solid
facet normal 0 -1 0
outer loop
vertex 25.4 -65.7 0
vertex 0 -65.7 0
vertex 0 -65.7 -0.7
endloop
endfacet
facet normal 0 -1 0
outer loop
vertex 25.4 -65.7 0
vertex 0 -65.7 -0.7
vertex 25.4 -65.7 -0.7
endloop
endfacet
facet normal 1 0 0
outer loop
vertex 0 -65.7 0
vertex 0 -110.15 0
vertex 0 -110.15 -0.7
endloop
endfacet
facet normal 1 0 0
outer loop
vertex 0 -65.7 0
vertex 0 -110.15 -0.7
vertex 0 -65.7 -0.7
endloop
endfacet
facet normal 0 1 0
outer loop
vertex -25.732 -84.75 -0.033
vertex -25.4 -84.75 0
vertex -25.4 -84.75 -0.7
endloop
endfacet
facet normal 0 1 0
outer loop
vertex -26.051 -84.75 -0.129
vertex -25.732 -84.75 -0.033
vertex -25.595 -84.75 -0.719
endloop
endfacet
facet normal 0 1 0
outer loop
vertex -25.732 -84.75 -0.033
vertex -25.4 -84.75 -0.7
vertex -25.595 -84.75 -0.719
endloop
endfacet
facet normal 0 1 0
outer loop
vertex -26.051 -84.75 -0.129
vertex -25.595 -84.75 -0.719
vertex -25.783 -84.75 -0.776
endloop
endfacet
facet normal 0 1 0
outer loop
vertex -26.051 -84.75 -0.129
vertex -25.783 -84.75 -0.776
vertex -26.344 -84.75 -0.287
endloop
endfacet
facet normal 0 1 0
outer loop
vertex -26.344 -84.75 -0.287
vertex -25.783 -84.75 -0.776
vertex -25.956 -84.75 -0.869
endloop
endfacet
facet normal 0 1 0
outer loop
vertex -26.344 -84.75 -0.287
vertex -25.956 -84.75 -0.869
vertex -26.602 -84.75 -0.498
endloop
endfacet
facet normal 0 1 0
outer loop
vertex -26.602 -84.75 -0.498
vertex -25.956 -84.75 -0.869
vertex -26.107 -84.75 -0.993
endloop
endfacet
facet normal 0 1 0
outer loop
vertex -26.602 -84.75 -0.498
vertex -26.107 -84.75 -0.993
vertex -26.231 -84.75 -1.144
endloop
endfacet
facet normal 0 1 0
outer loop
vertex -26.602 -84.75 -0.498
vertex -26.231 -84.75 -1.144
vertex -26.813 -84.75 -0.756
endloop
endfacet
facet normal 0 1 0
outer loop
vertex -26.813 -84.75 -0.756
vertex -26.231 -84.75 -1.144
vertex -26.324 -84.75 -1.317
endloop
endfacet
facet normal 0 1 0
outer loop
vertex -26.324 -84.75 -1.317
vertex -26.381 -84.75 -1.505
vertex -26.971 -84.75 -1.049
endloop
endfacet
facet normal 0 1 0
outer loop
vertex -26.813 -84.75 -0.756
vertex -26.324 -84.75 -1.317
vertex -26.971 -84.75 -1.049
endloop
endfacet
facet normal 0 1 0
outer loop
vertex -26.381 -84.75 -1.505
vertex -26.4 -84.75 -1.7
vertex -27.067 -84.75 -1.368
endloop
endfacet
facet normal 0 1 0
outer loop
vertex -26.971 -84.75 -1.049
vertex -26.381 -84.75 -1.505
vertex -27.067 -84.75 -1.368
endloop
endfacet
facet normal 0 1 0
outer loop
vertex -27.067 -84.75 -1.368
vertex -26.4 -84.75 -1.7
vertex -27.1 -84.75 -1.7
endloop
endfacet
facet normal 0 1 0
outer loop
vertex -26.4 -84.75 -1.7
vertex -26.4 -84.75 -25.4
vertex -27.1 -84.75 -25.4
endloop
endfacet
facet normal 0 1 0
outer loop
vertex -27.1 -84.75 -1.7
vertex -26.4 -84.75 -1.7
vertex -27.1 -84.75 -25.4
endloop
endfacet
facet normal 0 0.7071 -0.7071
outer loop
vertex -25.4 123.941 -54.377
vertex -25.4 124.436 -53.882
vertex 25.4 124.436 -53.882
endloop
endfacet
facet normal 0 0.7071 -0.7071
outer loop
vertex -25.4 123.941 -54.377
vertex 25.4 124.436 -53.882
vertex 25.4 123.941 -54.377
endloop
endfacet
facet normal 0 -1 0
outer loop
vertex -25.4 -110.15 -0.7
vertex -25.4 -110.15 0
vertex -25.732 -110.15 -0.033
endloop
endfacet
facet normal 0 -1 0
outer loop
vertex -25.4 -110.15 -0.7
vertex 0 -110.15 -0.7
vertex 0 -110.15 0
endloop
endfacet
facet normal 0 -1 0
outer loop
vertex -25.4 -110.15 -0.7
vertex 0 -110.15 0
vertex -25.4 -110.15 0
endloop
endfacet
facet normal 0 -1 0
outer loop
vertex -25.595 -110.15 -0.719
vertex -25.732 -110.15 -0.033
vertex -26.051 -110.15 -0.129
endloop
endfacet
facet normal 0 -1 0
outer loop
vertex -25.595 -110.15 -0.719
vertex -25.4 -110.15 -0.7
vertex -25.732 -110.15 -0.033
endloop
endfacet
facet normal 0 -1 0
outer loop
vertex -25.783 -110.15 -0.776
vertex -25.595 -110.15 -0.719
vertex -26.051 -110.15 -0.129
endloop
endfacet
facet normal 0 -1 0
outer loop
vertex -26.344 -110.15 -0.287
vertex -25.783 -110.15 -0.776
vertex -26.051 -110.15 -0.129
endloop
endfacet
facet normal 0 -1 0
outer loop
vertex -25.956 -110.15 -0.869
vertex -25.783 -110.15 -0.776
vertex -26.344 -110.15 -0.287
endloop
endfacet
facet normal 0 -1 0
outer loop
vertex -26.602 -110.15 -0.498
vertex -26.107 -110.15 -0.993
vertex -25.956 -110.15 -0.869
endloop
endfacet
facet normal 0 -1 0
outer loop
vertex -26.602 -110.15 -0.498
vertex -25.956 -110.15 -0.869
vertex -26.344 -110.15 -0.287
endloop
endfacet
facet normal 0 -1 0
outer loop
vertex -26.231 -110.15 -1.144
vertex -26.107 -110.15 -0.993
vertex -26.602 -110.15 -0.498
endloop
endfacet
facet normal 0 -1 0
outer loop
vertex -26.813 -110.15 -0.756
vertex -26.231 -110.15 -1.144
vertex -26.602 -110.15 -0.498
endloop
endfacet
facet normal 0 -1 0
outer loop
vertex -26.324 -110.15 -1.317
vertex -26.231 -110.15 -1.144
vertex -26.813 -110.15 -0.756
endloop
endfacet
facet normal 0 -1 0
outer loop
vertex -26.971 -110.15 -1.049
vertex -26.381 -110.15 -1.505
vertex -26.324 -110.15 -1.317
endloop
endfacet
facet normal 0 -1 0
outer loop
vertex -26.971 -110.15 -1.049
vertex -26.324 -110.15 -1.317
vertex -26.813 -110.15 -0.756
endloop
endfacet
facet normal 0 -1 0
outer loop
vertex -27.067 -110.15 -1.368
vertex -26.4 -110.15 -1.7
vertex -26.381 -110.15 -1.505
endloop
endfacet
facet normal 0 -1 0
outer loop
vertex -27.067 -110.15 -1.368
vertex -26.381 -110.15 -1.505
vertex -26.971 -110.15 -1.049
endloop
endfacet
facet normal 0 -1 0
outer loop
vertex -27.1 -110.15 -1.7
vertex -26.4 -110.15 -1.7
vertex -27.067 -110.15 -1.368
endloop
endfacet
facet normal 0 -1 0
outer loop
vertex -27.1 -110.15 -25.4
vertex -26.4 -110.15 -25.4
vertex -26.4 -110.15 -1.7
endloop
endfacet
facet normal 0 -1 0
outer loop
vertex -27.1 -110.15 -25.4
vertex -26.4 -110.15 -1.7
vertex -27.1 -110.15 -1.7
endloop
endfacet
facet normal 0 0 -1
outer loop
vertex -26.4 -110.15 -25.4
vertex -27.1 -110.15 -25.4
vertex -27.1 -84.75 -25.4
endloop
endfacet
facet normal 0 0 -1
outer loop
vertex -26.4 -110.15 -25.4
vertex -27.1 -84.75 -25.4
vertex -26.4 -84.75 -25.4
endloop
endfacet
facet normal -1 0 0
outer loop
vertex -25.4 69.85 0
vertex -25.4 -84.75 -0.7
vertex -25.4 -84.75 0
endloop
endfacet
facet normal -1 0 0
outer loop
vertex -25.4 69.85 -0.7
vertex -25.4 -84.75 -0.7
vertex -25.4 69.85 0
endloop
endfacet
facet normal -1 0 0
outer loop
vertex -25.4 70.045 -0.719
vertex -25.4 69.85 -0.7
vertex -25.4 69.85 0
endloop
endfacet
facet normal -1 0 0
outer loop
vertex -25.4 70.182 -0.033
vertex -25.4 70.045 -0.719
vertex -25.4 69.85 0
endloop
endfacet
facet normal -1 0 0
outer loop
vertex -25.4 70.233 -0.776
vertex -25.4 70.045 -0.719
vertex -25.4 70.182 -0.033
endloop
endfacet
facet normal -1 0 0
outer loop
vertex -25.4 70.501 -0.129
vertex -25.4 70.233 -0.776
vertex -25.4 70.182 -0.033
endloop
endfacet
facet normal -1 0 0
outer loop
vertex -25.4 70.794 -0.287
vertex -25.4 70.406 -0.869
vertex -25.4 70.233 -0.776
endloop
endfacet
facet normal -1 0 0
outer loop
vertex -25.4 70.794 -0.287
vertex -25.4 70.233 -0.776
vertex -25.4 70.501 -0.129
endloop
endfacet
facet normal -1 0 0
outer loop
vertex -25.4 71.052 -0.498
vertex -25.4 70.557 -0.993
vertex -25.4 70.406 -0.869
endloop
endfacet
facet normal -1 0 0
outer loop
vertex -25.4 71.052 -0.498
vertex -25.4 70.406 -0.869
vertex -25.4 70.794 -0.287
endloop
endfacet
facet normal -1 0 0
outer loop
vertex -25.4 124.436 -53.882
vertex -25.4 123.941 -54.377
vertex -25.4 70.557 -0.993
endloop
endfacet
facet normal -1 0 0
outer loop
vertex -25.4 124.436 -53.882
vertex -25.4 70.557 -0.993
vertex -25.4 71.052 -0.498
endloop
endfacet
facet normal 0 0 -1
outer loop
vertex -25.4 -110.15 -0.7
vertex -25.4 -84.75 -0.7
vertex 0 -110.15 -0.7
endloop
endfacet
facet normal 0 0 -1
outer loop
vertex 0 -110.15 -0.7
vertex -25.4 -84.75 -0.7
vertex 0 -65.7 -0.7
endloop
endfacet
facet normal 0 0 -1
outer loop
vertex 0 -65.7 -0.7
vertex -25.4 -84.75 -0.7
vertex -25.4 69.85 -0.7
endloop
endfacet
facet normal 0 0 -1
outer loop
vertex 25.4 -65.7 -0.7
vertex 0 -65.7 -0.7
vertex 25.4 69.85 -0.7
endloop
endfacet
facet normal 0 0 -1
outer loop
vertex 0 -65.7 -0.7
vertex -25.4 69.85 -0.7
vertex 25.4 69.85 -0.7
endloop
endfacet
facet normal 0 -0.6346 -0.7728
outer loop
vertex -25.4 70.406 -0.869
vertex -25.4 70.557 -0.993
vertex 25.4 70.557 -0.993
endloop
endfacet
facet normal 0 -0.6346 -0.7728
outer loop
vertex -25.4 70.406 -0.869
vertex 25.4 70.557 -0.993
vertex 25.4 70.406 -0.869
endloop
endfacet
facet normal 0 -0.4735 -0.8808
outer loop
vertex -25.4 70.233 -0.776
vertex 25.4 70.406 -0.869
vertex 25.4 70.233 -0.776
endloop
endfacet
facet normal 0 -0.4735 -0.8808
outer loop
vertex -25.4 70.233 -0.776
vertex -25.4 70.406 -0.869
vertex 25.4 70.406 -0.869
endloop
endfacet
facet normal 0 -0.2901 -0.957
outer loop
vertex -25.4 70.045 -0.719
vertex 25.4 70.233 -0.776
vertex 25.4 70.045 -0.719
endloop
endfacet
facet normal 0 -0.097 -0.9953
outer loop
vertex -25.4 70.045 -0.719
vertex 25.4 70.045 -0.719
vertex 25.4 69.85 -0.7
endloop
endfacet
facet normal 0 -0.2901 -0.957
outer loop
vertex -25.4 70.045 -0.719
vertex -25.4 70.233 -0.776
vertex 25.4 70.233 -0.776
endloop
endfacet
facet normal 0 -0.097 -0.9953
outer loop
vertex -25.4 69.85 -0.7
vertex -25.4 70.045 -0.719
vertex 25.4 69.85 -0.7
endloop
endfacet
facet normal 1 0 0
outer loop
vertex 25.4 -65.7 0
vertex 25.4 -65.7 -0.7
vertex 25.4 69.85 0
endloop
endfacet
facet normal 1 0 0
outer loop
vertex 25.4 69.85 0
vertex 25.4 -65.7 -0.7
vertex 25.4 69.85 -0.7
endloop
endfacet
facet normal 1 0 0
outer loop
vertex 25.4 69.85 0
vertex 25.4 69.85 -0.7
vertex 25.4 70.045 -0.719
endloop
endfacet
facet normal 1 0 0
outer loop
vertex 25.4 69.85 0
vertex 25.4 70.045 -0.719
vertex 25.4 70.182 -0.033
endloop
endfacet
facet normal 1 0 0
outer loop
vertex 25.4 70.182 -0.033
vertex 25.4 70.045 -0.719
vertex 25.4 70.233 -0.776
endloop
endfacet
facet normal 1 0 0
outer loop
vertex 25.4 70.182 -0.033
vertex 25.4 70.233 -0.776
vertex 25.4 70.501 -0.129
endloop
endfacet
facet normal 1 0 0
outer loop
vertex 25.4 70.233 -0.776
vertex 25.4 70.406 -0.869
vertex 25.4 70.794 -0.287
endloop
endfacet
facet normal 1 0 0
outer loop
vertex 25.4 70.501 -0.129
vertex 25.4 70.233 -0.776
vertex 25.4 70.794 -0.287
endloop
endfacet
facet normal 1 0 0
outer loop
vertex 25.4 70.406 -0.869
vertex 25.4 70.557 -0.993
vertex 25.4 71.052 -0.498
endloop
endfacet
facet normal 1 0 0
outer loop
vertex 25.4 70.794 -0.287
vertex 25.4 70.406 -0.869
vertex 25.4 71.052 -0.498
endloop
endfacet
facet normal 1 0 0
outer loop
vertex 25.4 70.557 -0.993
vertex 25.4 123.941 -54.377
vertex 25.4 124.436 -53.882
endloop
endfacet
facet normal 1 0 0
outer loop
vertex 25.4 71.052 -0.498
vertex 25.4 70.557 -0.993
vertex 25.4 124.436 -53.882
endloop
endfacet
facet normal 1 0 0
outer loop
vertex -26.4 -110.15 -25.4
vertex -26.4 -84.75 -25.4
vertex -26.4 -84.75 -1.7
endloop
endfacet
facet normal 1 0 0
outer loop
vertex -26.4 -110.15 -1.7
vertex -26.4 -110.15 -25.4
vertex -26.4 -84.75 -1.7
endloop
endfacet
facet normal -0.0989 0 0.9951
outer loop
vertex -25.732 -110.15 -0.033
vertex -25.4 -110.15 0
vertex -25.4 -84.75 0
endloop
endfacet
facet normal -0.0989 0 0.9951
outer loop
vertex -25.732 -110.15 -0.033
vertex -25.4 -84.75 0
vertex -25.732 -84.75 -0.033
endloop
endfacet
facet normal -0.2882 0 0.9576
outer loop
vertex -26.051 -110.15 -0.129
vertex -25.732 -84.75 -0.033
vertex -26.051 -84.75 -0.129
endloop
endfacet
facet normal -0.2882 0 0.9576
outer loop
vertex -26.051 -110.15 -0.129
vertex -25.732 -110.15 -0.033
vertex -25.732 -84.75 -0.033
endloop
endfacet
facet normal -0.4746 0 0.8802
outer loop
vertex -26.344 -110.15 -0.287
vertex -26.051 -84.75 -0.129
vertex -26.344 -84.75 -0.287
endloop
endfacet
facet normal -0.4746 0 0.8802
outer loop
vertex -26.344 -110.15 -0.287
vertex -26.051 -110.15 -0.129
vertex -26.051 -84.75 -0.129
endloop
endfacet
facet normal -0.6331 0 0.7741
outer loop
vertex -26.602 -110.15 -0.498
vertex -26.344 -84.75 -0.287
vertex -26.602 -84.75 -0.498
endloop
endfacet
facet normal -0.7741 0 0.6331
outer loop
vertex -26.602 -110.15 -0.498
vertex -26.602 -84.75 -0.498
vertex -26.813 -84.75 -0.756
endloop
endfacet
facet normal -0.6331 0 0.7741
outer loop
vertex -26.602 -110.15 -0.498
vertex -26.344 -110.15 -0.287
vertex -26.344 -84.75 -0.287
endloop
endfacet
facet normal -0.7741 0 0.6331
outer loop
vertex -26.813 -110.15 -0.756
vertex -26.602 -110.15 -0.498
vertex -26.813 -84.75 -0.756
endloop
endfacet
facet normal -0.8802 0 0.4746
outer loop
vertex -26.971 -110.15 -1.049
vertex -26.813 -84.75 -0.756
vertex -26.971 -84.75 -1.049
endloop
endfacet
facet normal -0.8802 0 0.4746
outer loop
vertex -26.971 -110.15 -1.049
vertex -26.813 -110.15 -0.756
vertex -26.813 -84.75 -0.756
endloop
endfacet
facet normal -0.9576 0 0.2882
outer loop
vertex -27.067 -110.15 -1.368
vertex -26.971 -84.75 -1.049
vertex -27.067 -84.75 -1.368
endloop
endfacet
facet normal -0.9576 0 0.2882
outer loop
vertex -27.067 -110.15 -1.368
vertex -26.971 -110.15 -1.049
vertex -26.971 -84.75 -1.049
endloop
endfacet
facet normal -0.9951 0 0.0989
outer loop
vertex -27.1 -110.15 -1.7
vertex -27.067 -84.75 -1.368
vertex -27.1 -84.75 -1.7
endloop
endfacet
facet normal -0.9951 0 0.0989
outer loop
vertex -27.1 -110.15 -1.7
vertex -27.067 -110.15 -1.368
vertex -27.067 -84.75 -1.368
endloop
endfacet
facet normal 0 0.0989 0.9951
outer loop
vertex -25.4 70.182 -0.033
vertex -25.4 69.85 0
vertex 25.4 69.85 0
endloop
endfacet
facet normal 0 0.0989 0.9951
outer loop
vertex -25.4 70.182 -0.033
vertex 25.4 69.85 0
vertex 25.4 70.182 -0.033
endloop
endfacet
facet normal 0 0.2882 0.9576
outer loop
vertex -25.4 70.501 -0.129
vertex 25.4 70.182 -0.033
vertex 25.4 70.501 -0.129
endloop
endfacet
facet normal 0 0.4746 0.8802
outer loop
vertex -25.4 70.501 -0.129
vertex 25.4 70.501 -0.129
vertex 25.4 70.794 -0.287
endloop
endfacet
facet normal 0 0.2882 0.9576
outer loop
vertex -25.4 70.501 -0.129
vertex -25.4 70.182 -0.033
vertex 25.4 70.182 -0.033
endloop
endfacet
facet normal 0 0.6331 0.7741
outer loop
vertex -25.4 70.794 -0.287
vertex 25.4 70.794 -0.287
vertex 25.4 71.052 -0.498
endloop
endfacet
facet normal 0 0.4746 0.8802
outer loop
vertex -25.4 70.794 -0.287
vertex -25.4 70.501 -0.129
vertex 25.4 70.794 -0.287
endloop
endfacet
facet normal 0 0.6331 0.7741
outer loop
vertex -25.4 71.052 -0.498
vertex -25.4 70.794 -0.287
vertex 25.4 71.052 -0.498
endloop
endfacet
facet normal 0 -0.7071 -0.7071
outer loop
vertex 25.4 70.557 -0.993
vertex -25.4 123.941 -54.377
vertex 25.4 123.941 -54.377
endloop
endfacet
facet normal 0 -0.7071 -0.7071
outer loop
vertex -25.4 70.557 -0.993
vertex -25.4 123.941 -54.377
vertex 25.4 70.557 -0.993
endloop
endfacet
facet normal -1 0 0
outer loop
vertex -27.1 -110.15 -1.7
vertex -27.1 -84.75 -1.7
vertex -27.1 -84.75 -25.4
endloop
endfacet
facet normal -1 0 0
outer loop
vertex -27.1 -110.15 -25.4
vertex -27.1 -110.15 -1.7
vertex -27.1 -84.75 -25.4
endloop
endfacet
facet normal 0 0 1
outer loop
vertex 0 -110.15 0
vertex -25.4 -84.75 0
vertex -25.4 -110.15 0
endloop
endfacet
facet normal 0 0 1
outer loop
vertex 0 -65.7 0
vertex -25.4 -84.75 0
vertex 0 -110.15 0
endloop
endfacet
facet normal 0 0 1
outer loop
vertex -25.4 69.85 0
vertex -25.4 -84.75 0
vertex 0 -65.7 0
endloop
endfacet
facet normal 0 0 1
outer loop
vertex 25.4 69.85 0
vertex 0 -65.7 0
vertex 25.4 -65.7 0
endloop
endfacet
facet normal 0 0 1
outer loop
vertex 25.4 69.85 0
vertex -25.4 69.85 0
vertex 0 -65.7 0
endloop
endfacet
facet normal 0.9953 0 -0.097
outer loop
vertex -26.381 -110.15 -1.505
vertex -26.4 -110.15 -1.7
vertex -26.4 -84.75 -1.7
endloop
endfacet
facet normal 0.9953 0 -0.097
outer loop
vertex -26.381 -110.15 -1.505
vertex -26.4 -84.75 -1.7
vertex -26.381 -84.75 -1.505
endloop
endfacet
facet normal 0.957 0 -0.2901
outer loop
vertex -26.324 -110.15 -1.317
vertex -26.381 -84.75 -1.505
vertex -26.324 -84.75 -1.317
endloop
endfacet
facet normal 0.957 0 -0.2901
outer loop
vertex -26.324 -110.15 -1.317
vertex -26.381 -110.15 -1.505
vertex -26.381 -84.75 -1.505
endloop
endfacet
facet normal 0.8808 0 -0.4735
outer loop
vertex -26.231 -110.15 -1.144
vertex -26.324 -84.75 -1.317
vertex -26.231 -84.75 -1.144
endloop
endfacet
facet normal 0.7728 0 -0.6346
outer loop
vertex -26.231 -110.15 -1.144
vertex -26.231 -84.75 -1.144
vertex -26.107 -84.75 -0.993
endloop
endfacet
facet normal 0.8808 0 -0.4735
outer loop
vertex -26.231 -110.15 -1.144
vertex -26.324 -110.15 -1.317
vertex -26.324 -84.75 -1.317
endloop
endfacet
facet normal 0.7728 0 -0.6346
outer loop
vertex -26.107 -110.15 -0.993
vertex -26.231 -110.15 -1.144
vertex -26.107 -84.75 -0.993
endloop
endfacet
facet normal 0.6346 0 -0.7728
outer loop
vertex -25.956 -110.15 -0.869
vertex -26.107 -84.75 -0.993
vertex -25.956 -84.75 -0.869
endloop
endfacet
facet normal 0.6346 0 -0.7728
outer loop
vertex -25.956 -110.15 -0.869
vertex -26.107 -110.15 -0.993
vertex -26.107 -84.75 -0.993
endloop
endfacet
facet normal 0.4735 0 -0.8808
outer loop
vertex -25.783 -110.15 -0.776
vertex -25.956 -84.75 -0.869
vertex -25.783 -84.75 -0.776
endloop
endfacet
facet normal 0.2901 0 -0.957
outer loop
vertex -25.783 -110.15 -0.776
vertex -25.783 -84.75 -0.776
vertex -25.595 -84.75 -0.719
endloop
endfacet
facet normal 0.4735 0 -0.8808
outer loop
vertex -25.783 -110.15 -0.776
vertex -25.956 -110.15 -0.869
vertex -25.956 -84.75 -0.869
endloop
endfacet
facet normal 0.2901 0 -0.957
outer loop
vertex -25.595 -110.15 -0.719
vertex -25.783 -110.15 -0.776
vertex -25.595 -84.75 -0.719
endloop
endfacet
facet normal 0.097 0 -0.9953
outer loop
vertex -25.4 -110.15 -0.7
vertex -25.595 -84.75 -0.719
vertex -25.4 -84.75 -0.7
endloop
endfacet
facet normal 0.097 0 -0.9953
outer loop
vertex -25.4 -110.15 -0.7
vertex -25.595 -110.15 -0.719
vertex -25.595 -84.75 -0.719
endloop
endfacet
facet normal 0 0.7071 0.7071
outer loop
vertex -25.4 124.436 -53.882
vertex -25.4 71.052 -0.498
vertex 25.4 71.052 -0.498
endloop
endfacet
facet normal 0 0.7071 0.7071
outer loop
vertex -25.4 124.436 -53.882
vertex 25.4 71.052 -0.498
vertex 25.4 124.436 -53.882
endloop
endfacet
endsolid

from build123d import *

# Parameters (mm, degrees)
SKETCH1_W          = 50.8
SKETCH1_H          = 180
BASE_FLANGE1_DEPTH = 0.7
EDGE_FLANGE1_DEPTH = 25.4
SKETCH9_W          = 25.4
SKETCH9_H          = 44.45
CUT_EXTRUDE1_DEPTH = 10
EDGE_FLANGE2_DEPTH = 50.8


# Sheet-metal steps are written as plain solids
with BuildPart() as part:
    # Sketch1 → Base-Flange1 (new body)
    with BuildSketch(Plane.XY):
        with Locations((0, -20.15)):
            Rectangle(SKETCH1_W, SKETCH1_H)
    extrude(amount=-BASE_FLANGE1_DEPTH)

    # Edge-Flange1 section (across the edge) → Edge-Flange1 (add)
    with BuildSketch(Plane(origin=(-26.4, -110.15, -0.7), x_dir=(1, 0, 0), z_dir=(0, 1, 0))):
        with BuildLine():
            Line((-0.7, 1), (-0.7, 24.7))
            Line((-0.7, 24.7), (0, 24.7))
            Line((0, 24.7), (0, 1))
            ThreePointArc((0, 1), (0.292893219, 0.292893219), (1, 0))
            Line((1, 0), (1, -0.7))
            ThreePointArc((1, -0.7), (-0.202081528, -0.202081528), (-0.7, 1))
        make_face()
    extrude(amount=EDGE_FLANGE1_DEPTH)

    # Sketch9 → Cut-Extrude1 (cut)
    with BuildSketch(Plane.XY):
        with Locations((12.7, -87.925)):
            Rectangle(SKETCH9_W, SKETCH9_H)
    extrude(amount=-CUT_EXTRUDE1_DEPTH, mode=Mode.SUBTRACT)

    # Edge-Flange2 section (across the edge) → Edge-Flange2 (add)
    with BuildSketch(Plane(origin=(-25.4, 70.264213562, -0.7), x_dir=(0, -0.7071067811865438, -0.7071067811865512), z_dir=(1, 0, 0))):
        with BuildLine():
            Line((-0.7, 0.414213562), (-0.7, 75.910050506))
            Line((-0.7, 75.910050506), (0, 75.910050506))
            Line((0, 75.910050506), (0, 0.414213562))
            ThreePointArc((0, 0.414213562), (0.076120467, 0.03153013), (0.292893219, -0.292893219))
            Line((0.292893219, -0.292893219), (-0.202081528, -0.787867966))
            ThreePointArc((-0.202081528, -0.787867966), (-0.570595205, -0.236348273), (-0.7, 0.414213562))
        make_face()
    extrude(amount=EDGE_FLANGE2_DEPTH)


solid = part.part
